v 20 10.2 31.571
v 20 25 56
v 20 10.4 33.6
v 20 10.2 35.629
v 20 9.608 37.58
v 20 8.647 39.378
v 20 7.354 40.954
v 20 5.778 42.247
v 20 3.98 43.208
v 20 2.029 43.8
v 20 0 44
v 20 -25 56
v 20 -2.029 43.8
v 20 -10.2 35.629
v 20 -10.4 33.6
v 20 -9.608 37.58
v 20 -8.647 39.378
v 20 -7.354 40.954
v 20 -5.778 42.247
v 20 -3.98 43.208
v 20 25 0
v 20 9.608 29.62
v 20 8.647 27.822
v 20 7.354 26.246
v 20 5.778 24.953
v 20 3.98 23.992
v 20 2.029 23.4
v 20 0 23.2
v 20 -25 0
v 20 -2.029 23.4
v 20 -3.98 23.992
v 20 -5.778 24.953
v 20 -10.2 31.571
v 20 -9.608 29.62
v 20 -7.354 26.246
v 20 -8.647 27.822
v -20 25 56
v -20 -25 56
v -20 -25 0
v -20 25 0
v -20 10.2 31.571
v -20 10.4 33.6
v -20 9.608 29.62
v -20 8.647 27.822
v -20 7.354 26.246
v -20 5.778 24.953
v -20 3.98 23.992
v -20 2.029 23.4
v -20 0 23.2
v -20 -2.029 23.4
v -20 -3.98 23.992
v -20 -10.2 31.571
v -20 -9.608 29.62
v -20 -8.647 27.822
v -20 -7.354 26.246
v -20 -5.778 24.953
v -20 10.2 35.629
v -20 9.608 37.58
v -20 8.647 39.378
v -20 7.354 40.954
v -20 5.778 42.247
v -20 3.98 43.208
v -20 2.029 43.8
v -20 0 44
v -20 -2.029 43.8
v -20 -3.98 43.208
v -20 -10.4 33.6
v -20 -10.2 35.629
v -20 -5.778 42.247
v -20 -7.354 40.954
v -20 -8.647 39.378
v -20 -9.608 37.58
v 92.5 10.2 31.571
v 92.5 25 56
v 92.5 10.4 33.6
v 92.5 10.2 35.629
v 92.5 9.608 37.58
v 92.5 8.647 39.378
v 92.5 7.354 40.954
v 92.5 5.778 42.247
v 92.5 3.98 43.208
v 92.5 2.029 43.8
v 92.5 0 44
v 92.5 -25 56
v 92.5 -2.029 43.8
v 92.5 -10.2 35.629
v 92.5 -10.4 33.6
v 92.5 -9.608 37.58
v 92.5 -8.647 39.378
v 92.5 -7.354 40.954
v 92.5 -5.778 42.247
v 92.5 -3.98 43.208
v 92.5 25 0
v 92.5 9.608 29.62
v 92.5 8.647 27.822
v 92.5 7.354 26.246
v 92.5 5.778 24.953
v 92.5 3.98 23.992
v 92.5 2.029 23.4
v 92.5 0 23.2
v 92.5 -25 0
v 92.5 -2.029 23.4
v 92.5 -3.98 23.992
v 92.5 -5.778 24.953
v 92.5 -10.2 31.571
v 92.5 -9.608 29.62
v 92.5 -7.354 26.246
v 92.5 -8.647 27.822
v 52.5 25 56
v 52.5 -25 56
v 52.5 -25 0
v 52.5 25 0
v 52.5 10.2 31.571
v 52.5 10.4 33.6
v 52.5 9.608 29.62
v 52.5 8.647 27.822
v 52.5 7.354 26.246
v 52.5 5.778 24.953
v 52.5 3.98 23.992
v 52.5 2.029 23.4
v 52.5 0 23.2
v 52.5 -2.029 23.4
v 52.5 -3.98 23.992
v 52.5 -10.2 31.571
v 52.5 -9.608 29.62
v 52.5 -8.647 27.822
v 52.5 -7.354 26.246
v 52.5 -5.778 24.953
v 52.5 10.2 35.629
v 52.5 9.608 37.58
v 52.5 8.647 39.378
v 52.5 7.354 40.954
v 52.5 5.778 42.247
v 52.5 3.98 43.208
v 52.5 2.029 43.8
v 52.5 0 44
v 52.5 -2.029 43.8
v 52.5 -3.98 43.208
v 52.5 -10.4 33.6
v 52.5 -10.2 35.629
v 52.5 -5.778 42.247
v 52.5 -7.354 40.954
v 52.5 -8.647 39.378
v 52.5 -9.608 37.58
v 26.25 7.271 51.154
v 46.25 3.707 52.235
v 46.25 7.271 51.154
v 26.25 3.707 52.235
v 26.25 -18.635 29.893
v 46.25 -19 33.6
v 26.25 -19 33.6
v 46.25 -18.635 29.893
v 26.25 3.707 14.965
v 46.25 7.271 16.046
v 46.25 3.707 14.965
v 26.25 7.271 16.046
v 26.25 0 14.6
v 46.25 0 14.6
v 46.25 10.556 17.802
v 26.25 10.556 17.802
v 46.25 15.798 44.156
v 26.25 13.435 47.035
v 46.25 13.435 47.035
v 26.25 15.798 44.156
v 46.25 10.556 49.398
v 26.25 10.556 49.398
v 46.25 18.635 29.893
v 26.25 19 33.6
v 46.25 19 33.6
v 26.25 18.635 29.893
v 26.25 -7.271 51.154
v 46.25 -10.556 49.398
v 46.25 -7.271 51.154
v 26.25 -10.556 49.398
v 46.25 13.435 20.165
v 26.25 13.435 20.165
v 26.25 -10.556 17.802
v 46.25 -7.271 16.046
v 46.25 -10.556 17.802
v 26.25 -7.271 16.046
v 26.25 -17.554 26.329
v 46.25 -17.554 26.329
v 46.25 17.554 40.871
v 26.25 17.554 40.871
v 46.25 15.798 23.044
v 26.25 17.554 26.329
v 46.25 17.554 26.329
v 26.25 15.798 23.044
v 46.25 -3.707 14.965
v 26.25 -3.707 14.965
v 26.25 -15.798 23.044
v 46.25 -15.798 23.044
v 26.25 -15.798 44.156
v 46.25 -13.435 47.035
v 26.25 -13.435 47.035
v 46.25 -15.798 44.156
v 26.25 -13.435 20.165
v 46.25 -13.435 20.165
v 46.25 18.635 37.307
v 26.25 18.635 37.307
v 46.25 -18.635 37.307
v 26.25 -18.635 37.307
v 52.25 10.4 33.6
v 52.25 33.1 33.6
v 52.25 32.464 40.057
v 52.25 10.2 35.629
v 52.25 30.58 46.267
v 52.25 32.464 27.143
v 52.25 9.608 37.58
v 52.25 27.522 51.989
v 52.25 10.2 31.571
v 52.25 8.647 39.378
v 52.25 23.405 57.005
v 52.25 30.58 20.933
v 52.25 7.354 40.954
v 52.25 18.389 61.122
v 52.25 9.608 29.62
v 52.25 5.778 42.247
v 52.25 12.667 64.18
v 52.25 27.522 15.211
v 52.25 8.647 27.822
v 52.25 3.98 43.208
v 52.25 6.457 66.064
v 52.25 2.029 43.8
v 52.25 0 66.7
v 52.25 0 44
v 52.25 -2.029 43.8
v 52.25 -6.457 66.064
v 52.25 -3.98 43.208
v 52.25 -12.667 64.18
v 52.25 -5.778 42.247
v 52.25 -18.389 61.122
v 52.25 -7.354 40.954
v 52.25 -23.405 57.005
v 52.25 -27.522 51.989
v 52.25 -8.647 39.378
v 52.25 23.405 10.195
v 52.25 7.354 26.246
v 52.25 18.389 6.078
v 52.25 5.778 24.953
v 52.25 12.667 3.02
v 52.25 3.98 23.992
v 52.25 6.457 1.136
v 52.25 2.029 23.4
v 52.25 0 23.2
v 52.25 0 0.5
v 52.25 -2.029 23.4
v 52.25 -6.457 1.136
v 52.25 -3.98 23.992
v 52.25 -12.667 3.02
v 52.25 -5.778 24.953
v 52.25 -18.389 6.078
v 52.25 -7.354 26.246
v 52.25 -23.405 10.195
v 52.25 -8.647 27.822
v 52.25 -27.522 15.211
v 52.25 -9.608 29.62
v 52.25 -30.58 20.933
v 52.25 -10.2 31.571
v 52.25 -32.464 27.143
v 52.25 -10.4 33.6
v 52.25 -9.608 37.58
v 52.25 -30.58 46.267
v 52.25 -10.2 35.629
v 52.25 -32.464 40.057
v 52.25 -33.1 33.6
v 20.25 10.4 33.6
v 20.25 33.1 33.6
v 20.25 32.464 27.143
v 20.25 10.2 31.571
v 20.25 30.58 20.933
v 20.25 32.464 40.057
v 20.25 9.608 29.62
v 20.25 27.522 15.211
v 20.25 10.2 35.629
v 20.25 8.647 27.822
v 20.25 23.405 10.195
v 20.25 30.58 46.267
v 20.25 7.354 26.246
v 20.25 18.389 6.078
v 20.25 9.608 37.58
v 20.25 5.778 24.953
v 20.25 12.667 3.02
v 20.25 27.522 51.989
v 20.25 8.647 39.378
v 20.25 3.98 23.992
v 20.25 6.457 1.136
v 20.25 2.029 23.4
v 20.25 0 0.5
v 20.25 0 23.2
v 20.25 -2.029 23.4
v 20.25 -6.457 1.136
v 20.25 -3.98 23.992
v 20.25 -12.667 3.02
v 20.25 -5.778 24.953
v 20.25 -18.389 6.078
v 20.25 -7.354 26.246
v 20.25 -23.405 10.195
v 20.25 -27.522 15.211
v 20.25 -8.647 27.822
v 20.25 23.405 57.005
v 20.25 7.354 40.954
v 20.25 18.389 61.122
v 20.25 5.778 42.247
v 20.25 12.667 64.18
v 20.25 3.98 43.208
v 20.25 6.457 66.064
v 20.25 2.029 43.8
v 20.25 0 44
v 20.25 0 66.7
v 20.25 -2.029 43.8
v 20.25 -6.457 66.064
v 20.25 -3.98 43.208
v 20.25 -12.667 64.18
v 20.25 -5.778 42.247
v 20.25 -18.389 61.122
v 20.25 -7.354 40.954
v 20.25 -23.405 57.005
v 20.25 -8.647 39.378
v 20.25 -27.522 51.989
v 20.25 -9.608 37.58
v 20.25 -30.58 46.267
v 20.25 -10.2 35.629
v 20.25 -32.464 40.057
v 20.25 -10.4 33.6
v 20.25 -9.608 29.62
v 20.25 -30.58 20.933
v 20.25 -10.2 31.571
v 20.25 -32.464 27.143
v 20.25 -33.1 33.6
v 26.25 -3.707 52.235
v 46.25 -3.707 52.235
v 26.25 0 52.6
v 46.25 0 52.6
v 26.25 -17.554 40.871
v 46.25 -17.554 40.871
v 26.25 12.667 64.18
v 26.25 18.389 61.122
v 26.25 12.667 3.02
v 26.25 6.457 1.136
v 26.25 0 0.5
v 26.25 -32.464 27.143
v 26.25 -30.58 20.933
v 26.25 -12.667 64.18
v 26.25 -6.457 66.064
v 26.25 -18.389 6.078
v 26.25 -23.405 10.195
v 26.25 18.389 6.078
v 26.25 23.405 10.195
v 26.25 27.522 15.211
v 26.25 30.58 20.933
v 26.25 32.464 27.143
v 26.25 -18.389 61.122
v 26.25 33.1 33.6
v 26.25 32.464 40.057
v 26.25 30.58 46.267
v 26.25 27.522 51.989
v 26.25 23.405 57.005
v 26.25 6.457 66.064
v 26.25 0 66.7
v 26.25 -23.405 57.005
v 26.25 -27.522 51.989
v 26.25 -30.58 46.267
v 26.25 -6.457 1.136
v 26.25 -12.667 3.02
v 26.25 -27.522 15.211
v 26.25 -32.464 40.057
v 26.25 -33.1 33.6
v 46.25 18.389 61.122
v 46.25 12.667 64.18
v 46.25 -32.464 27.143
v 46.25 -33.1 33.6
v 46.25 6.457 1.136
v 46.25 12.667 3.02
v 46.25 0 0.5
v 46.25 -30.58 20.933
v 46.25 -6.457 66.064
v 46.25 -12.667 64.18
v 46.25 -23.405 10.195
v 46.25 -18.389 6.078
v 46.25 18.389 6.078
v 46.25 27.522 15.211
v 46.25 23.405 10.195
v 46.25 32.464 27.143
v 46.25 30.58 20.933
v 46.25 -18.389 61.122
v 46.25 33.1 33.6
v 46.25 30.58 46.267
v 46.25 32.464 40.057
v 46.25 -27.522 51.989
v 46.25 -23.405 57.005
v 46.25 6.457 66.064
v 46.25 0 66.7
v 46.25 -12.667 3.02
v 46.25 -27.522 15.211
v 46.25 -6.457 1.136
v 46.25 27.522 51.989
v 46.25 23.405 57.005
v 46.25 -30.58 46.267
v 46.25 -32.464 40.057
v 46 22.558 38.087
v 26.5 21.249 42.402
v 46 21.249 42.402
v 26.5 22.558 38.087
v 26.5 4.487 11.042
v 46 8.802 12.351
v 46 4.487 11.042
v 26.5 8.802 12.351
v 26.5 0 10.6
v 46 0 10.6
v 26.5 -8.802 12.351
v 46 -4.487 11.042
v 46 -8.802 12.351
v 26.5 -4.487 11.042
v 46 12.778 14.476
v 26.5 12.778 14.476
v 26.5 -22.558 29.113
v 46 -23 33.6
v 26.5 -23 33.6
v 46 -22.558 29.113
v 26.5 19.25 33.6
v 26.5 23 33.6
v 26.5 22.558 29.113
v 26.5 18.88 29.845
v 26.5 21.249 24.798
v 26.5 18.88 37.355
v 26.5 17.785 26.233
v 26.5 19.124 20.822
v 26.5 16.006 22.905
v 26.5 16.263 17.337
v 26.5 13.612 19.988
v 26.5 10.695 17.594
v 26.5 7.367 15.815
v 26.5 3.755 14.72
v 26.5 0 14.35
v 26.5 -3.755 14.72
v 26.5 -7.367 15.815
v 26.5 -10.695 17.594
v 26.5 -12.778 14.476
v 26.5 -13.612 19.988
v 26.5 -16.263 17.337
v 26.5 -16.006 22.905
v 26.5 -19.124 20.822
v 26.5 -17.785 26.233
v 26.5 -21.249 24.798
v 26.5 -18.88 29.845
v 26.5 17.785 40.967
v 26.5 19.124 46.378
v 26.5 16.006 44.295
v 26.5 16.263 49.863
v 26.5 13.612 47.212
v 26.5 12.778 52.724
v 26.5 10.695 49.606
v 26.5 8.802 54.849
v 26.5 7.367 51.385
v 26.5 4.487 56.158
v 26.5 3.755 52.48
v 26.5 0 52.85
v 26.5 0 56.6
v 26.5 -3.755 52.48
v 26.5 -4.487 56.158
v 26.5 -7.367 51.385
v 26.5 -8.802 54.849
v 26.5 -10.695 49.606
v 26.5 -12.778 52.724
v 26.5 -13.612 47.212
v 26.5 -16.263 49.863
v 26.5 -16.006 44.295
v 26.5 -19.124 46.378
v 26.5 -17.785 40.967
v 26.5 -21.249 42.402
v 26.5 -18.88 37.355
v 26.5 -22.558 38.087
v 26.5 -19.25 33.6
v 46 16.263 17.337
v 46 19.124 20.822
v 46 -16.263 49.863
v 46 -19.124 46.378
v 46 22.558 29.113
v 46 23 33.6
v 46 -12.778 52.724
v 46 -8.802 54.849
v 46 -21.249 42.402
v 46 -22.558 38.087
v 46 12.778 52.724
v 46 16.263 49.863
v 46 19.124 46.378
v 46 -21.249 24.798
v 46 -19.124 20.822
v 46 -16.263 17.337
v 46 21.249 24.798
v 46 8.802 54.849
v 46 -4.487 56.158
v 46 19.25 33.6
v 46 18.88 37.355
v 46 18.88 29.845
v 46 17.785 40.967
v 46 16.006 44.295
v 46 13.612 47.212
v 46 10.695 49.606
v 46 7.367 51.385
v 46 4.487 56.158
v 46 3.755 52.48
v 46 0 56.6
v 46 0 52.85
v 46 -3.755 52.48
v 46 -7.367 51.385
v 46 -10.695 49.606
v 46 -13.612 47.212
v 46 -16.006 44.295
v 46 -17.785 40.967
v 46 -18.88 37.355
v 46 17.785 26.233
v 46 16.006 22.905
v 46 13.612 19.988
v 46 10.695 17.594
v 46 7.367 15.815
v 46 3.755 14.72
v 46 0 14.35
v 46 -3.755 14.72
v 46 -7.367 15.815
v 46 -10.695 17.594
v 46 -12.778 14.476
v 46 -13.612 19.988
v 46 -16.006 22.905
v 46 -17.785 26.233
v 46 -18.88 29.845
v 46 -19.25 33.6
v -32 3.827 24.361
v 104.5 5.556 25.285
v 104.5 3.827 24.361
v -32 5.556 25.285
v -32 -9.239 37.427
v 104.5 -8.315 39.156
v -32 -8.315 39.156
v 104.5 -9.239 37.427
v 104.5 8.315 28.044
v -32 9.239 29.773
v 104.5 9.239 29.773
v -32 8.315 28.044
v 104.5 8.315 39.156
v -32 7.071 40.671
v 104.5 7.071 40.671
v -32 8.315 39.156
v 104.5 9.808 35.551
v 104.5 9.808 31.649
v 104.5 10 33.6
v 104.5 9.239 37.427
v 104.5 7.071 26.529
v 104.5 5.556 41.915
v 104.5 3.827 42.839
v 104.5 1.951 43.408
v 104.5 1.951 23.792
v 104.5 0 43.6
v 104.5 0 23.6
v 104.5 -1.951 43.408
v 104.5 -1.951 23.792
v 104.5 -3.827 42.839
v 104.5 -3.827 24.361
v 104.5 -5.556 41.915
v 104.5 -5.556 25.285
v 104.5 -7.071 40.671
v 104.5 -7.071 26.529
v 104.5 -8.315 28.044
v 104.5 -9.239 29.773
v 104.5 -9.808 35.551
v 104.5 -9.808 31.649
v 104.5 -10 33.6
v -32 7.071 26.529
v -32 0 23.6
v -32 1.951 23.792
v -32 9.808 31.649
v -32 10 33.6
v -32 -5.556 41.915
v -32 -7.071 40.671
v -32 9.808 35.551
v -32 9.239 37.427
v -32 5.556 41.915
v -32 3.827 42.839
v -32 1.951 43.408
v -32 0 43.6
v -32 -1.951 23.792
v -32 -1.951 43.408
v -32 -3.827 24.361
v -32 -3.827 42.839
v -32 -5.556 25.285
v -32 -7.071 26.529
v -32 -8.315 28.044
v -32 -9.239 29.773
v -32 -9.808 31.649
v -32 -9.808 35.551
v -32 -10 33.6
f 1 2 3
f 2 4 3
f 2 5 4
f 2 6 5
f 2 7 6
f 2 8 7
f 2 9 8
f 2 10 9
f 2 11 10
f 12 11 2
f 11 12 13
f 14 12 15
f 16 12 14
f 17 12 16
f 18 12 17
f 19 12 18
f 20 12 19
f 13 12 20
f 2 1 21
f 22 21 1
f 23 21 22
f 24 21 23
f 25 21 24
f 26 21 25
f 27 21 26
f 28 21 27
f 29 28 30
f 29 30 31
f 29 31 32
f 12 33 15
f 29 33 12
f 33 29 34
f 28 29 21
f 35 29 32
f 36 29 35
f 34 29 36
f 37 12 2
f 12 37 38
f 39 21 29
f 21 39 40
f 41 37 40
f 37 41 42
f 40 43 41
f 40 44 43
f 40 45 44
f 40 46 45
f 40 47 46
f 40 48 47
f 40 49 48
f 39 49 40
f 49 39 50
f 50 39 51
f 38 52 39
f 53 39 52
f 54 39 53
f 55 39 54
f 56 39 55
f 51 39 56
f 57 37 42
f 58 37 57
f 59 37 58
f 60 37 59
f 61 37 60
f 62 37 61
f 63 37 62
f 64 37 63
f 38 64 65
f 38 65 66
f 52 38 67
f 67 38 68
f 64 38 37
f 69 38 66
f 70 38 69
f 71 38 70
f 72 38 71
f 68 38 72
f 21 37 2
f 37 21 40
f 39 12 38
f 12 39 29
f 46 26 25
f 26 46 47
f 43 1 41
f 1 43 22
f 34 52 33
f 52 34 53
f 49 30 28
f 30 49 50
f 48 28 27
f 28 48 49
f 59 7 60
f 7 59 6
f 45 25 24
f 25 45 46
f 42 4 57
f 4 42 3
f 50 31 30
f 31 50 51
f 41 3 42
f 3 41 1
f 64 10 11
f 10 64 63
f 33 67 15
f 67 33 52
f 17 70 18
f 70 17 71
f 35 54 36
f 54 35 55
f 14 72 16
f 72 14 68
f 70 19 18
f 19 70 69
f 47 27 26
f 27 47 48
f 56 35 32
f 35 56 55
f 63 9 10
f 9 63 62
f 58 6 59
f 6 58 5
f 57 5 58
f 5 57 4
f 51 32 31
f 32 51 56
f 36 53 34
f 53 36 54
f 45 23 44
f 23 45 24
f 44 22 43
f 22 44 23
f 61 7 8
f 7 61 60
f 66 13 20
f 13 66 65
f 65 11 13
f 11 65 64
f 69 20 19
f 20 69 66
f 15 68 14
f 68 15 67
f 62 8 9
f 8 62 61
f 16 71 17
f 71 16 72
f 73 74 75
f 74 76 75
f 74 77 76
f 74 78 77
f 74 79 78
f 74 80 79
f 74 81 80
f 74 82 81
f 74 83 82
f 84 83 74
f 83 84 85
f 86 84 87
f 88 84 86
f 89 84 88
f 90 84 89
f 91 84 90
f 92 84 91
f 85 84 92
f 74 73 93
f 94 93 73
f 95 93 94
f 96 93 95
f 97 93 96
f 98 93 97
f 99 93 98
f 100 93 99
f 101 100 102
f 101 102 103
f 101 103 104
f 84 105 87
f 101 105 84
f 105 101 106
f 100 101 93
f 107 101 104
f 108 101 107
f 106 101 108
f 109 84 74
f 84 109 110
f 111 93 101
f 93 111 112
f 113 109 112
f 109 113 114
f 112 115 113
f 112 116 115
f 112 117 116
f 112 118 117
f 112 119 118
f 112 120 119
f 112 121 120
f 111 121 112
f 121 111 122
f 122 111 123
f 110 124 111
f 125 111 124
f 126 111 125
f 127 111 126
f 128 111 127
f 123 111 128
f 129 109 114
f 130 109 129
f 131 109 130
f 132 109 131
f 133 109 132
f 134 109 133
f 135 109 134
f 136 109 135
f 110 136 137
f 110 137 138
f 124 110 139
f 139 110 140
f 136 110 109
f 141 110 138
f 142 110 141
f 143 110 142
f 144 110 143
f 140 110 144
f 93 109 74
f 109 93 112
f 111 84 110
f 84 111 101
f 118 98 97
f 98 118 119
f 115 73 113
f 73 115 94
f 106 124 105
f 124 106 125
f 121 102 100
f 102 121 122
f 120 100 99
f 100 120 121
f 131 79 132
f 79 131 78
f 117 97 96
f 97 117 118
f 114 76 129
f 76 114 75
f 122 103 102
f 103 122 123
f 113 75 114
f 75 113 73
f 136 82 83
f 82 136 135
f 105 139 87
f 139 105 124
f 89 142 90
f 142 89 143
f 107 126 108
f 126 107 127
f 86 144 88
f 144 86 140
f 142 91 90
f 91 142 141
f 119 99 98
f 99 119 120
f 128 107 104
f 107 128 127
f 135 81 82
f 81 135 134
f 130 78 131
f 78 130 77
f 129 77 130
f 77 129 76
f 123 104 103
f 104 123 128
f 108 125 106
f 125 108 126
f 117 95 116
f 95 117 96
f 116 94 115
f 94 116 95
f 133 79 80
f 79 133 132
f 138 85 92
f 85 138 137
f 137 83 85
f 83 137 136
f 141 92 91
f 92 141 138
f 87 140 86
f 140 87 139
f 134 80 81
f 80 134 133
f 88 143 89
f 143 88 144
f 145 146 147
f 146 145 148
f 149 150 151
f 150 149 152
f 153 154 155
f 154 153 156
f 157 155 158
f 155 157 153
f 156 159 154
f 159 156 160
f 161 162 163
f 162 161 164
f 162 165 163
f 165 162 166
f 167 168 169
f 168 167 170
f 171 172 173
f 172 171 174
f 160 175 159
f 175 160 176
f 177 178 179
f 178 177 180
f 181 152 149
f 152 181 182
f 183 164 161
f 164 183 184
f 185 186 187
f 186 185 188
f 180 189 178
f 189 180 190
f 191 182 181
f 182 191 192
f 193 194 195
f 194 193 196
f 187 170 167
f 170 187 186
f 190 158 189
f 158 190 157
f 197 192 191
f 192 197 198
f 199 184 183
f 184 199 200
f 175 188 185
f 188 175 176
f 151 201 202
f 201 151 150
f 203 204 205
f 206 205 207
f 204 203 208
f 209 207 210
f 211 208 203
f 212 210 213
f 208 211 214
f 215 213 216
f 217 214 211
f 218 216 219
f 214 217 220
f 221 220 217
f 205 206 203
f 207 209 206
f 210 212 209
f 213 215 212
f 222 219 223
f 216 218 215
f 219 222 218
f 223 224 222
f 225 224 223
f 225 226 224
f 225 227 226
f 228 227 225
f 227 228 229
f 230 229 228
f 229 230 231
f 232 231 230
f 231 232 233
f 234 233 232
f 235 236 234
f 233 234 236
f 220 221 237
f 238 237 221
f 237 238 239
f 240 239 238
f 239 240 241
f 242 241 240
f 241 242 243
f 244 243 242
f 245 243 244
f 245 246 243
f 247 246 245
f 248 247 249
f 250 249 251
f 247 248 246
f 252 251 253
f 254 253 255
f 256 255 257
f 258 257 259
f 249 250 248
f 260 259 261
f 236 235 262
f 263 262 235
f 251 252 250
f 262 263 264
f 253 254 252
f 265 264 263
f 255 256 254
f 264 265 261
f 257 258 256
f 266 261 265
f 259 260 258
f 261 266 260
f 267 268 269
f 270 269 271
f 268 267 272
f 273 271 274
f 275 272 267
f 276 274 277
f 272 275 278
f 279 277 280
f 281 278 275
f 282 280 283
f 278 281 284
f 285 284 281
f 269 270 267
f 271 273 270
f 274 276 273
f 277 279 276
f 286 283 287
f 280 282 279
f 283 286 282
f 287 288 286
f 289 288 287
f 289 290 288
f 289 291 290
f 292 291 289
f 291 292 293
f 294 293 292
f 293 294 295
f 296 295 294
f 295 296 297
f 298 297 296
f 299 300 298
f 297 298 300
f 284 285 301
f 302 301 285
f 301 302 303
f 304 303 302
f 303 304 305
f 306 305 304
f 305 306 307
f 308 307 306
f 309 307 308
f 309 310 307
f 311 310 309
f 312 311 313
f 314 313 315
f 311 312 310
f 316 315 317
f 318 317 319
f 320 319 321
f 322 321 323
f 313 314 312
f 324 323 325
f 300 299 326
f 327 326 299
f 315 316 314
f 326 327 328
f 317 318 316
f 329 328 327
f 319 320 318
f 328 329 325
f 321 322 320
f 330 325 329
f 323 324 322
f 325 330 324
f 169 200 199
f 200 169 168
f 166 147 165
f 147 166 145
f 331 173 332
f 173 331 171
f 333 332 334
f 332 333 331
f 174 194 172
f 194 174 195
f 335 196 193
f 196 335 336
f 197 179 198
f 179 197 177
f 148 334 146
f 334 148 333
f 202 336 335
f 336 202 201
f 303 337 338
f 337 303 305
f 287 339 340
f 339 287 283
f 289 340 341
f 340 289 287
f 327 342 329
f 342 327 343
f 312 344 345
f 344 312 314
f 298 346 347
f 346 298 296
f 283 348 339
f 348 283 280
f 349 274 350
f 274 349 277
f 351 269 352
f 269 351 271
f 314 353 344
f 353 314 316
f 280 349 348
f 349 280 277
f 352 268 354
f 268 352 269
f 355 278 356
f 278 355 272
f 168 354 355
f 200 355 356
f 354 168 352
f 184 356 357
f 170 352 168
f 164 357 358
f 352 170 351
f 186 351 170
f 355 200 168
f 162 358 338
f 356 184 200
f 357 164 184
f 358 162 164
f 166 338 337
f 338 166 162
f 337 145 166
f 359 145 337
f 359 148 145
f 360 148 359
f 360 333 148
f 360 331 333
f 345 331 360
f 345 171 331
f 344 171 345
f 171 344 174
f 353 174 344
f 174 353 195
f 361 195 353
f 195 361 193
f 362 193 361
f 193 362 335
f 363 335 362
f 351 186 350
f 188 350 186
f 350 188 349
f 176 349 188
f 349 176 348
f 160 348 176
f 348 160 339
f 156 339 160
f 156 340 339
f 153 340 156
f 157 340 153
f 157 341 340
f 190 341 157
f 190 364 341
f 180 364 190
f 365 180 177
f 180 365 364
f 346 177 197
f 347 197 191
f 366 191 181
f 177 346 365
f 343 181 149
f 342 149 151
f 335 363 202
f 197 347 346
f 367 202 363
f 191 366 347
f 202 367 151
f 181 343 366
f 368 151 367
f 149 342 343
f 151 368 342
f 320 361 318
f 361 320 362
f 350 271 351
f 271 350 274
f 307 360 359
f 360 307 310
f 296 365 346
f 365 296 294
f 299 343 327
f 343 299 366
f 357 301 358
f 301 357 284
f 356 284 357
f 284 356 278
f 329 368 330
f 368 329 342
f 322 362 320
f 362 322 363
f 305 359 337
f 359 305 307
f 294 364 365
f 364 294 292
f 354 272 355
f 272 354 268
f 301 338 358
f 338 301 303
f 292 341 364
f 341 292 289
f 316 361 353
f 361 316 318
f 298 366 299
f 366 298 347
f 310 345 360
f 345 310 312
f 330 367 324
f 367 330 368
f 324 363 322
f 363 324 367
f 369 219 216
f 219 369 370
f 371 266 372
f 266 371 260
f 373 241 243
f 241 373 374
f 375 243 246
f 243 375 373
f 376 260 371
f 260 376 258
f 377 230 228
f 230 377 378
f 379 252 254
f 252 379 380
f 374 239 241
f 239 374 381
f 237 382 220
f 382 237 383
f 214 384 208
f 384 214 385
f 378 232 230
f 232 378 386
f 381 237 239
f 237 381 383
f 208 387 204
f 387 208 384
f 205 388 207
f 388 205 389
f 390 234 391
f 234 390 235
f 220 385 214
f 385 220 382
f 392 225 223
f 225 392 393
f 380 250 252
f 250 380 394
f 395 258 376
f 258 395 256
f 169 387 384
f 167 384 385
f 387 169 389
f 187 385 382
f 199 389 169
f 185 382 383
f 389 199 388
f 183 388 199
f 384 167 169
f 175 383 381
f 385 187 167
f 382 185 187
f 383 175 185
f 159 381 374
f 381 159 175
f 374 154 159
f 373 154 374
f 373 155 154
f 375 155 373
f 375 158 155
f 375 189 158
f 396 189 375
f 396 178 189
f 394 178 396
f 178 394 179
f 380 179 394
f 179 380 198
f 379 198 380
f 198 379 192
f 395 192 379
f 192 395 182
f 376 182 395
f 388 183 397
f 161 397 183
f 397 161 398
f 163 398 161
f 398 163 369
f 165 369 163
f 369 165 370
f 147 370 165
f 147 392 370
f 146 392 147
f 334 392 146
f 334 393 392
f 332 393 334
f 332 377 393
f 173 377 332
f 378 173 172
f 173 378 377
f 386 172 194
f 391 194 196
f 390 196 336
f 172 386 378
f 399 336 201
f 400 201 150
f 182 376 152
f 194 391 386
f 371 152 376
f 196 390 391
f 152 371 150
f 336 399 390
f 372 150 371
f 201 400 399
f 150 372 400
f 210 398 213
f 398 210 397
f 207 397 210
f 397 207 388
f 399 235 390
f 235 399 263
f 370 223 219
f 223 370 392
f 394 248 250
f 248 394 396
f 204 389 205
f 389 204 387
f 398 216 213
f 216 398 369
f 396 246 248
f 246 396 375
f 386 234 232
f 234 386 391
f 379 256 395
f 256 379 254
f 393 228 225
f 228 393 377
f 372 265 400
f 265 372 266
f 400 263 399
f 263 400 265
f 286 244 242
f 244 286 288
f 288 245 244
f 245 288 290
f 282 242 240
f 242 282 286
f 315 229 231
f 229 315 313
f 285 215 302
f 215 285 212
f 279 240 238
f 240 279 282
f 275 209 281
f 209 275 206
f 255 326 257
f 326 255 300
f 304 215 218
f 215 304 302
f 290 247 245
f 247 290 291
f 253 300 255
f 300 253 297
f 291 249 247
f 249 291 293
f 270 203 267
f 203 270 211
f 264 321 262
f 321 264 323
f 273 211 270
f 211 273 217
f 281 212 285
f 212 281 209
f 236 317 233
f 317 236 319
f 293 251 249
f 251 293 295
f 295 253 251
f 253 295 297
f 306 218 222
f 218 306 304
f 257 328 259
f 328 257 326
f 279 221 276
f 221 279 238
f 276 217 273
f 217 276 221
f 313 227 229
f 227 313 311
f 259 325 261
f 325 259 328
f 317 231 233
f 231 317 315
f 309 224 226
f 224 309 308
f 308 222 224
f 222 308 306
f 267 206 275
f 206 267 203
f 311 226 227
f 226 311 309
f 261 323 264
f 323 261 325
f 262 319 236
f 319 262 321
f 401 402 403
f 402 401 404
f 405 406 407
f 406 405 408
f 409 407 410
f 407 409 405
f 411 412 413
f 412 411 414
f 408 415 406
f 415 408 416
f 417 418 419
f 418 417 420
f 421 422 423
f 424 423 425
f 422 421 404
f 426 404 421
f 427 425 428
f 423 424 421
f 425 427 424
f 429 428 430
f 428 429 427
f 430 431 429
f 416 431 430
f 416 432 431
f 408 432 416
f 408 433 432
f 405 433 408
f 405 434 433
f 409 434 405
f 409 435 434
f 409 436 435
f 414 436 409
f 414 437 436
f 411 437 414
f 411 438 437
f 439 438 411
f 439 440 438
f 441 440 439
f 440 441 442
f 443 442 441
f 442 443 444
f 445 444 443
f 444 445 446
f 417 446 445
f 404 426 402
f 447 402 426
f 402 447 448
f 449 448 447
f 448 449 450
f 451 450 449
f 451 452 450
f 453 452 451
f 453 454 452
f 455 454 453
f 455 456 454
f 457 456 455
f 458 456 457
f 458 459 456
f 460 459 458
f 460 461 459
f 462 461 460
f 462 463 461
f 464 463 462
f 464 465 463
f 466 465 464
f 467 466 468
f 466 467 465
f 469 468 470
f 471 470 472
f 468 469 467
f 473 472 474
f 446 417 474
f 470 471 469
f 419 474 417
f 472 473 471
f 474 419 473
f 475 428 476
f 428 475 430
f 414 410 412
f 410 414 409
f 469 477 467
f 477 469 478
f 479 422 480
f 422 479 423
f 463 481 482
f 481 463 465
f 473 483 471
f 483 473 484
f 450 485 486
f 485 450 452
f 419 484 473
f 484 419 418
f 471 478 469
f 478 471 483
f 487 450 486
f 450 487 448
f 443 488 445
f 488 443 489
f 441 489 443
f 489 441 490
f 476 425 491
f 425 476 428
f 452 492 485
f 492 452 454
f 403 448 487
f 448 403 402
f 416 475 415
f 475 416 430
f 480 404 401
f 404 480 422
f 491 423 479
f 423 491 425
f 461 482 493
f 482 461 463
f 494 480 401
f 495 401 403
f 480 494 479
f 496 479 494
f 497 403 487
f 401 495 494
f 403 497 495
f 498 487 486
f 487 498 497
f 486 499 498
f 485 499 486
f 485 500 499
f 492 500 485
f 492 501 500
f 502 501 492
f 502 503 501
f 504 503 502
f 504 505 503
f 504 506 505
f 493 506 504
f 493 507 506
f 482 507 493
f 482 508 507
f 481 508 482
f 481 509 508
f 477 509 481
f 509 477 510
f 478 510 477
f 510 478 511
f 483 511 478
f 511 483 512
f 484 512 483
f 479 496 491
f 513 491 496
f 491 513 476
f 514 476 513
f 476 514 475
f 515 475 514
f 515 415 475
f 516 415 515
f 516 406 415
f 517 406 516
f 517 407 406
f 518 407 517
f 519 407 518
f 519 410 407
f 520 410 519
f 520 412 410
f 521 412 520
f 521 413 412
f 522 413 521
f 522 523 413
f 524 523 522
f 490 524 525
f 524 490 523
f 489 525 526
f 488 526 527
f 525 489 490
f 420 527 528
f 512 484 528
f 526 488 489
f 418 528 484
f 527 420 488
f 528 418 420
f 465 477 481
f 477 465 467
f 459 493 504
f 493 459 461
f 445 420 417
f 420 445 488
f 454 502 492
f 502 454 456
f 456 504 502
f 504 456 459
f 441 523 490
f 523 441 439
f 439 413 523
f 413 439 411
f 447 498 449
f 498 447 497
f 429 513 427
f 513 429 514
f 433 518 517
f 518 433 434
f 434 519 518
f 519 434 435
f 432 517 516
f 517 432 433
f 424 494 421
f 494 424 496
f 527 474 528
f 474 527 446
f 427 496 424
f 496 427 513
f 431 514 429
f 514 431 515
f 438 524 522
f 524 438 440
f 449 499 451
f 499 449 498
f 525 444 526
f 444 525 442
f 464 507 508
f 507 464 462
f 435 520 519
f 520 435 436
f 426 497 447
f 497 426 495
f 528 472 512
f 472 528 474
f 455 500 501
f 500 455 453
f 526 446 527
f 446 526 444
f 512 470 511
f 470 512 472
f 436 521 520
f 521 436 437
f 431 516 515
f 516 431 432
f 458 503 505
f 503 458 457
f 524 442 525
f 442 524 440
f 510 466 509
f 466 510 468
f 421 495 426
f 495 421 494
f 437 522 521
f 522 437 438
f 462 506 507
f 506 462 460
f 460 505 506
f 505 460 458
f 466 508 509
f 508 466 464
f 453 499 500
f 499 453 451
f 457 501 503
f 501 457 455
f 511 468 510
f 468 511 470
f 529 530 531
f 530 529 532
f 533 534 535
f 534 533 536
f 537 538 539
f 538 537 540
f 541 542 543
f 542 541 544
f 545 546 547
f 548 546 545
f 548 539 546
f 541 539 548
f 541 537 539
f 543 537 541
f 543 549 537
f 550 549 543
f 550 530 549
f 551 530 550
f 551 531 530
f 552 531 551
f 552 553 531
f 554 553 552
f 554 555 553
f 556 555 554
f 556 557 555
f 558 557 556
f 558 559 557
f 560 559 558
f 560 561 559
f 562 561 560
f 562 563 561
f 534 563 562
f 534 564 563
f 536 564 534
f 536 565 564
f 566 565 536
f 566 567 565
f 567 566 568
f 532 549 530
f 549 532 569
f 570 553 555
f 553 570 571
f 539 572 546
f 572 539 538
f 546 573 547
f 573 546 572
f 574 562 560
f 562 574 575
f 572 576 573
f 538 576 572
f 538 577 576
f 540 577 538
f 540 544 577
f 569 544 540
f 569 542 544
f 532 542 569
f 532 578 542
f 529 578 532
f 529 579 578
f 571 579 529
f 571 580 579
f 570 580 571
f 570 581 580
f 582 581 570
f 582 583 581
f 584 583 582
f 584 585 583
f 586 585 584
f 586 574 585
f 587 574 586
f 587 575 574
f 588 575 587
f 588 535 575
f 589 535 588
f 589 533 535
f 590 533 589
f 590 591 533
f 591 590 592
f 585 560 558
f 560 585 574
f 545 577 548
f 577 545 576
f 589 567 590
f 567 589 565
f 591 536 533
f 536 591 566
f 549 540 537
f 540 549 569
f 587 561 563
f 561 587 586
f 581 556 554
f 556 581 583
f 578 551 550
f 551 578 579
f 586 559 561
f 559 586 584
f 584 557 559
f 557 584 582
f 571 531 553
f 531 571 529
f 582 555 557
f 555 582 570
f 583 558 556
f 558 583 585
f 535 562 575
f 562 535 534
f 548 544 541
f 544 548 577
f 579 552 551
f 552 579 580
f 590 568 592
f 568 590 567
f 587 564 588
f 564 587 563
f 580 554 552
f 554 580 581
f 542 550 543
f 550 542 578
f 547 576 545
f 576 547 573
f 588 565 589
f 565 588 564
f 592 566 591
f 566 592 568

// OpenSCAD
$fn = 32;

// ------------------------------------------------------------------------
// Pulley assembly: d66.2 pulley with a belt, shaft d20
// Every part is its own module, assembly() places them once.
// ------------------------------------------------------------------------

// --- part 1 ---
module support1() {
  difference() {
    translate([-20, -25, 0]) cube([40, 50, 56]);
    translate([0, 0, 33.6]) rotate([0, 90, 0]) cylinder(h = 42, d = 20.8, center = true);
  }
}

// --- part 2 ---
module support2() {
  difference() {
    translate([-20, -25, 0]) cube([40, 50, 56]);
    translate([0, 0, 33.6]) rotate([0, 90, 0]) cylinder(h = 42, d = 20.8, center = true);
  }
}

// --- part 3 ---
module shaft() {
  translate([0, 0, -68.25]) cylinder(h = 136.5, d = 20);
}

// --- part 4 ---
module pulley() {
  difference() {
    union() {
      cylinder(h = 32, d = 38);
      cylinder(h = 6, d = 66.2);
      translate([0, 0, 26]) cylinder(h = 6, d = 66.2);
    }
    translate([0, 0, -1]) cylinder(h = 34, d = 20.8);
  }
}

// --- part 5 ---
module belt() {
  difference() {
      translate([0, 0, 0]) cylinder(h = 19.5, d = 46);
      translate([0, 0, -1]) cylinder(h = 21.5, d = 38.5);
    }
}

// --- assembly ---
module assembly() {
  translate([0, 0, 0]) rotate([0, 0, 0]) support1();
  translate([72.5, 0, 0]) rotate([0, 0, 0]) support2();
  translate([36.25, 0, 33.6]) rotate([0, 90, 0]) shaft();
  translate([20.25, 0, 33.6]) rotate([0, 90, 0]) pulley();
  translate([26.5, 0, 33.6]) rotate([0, 90, 0]) belt();
}

assembly();
